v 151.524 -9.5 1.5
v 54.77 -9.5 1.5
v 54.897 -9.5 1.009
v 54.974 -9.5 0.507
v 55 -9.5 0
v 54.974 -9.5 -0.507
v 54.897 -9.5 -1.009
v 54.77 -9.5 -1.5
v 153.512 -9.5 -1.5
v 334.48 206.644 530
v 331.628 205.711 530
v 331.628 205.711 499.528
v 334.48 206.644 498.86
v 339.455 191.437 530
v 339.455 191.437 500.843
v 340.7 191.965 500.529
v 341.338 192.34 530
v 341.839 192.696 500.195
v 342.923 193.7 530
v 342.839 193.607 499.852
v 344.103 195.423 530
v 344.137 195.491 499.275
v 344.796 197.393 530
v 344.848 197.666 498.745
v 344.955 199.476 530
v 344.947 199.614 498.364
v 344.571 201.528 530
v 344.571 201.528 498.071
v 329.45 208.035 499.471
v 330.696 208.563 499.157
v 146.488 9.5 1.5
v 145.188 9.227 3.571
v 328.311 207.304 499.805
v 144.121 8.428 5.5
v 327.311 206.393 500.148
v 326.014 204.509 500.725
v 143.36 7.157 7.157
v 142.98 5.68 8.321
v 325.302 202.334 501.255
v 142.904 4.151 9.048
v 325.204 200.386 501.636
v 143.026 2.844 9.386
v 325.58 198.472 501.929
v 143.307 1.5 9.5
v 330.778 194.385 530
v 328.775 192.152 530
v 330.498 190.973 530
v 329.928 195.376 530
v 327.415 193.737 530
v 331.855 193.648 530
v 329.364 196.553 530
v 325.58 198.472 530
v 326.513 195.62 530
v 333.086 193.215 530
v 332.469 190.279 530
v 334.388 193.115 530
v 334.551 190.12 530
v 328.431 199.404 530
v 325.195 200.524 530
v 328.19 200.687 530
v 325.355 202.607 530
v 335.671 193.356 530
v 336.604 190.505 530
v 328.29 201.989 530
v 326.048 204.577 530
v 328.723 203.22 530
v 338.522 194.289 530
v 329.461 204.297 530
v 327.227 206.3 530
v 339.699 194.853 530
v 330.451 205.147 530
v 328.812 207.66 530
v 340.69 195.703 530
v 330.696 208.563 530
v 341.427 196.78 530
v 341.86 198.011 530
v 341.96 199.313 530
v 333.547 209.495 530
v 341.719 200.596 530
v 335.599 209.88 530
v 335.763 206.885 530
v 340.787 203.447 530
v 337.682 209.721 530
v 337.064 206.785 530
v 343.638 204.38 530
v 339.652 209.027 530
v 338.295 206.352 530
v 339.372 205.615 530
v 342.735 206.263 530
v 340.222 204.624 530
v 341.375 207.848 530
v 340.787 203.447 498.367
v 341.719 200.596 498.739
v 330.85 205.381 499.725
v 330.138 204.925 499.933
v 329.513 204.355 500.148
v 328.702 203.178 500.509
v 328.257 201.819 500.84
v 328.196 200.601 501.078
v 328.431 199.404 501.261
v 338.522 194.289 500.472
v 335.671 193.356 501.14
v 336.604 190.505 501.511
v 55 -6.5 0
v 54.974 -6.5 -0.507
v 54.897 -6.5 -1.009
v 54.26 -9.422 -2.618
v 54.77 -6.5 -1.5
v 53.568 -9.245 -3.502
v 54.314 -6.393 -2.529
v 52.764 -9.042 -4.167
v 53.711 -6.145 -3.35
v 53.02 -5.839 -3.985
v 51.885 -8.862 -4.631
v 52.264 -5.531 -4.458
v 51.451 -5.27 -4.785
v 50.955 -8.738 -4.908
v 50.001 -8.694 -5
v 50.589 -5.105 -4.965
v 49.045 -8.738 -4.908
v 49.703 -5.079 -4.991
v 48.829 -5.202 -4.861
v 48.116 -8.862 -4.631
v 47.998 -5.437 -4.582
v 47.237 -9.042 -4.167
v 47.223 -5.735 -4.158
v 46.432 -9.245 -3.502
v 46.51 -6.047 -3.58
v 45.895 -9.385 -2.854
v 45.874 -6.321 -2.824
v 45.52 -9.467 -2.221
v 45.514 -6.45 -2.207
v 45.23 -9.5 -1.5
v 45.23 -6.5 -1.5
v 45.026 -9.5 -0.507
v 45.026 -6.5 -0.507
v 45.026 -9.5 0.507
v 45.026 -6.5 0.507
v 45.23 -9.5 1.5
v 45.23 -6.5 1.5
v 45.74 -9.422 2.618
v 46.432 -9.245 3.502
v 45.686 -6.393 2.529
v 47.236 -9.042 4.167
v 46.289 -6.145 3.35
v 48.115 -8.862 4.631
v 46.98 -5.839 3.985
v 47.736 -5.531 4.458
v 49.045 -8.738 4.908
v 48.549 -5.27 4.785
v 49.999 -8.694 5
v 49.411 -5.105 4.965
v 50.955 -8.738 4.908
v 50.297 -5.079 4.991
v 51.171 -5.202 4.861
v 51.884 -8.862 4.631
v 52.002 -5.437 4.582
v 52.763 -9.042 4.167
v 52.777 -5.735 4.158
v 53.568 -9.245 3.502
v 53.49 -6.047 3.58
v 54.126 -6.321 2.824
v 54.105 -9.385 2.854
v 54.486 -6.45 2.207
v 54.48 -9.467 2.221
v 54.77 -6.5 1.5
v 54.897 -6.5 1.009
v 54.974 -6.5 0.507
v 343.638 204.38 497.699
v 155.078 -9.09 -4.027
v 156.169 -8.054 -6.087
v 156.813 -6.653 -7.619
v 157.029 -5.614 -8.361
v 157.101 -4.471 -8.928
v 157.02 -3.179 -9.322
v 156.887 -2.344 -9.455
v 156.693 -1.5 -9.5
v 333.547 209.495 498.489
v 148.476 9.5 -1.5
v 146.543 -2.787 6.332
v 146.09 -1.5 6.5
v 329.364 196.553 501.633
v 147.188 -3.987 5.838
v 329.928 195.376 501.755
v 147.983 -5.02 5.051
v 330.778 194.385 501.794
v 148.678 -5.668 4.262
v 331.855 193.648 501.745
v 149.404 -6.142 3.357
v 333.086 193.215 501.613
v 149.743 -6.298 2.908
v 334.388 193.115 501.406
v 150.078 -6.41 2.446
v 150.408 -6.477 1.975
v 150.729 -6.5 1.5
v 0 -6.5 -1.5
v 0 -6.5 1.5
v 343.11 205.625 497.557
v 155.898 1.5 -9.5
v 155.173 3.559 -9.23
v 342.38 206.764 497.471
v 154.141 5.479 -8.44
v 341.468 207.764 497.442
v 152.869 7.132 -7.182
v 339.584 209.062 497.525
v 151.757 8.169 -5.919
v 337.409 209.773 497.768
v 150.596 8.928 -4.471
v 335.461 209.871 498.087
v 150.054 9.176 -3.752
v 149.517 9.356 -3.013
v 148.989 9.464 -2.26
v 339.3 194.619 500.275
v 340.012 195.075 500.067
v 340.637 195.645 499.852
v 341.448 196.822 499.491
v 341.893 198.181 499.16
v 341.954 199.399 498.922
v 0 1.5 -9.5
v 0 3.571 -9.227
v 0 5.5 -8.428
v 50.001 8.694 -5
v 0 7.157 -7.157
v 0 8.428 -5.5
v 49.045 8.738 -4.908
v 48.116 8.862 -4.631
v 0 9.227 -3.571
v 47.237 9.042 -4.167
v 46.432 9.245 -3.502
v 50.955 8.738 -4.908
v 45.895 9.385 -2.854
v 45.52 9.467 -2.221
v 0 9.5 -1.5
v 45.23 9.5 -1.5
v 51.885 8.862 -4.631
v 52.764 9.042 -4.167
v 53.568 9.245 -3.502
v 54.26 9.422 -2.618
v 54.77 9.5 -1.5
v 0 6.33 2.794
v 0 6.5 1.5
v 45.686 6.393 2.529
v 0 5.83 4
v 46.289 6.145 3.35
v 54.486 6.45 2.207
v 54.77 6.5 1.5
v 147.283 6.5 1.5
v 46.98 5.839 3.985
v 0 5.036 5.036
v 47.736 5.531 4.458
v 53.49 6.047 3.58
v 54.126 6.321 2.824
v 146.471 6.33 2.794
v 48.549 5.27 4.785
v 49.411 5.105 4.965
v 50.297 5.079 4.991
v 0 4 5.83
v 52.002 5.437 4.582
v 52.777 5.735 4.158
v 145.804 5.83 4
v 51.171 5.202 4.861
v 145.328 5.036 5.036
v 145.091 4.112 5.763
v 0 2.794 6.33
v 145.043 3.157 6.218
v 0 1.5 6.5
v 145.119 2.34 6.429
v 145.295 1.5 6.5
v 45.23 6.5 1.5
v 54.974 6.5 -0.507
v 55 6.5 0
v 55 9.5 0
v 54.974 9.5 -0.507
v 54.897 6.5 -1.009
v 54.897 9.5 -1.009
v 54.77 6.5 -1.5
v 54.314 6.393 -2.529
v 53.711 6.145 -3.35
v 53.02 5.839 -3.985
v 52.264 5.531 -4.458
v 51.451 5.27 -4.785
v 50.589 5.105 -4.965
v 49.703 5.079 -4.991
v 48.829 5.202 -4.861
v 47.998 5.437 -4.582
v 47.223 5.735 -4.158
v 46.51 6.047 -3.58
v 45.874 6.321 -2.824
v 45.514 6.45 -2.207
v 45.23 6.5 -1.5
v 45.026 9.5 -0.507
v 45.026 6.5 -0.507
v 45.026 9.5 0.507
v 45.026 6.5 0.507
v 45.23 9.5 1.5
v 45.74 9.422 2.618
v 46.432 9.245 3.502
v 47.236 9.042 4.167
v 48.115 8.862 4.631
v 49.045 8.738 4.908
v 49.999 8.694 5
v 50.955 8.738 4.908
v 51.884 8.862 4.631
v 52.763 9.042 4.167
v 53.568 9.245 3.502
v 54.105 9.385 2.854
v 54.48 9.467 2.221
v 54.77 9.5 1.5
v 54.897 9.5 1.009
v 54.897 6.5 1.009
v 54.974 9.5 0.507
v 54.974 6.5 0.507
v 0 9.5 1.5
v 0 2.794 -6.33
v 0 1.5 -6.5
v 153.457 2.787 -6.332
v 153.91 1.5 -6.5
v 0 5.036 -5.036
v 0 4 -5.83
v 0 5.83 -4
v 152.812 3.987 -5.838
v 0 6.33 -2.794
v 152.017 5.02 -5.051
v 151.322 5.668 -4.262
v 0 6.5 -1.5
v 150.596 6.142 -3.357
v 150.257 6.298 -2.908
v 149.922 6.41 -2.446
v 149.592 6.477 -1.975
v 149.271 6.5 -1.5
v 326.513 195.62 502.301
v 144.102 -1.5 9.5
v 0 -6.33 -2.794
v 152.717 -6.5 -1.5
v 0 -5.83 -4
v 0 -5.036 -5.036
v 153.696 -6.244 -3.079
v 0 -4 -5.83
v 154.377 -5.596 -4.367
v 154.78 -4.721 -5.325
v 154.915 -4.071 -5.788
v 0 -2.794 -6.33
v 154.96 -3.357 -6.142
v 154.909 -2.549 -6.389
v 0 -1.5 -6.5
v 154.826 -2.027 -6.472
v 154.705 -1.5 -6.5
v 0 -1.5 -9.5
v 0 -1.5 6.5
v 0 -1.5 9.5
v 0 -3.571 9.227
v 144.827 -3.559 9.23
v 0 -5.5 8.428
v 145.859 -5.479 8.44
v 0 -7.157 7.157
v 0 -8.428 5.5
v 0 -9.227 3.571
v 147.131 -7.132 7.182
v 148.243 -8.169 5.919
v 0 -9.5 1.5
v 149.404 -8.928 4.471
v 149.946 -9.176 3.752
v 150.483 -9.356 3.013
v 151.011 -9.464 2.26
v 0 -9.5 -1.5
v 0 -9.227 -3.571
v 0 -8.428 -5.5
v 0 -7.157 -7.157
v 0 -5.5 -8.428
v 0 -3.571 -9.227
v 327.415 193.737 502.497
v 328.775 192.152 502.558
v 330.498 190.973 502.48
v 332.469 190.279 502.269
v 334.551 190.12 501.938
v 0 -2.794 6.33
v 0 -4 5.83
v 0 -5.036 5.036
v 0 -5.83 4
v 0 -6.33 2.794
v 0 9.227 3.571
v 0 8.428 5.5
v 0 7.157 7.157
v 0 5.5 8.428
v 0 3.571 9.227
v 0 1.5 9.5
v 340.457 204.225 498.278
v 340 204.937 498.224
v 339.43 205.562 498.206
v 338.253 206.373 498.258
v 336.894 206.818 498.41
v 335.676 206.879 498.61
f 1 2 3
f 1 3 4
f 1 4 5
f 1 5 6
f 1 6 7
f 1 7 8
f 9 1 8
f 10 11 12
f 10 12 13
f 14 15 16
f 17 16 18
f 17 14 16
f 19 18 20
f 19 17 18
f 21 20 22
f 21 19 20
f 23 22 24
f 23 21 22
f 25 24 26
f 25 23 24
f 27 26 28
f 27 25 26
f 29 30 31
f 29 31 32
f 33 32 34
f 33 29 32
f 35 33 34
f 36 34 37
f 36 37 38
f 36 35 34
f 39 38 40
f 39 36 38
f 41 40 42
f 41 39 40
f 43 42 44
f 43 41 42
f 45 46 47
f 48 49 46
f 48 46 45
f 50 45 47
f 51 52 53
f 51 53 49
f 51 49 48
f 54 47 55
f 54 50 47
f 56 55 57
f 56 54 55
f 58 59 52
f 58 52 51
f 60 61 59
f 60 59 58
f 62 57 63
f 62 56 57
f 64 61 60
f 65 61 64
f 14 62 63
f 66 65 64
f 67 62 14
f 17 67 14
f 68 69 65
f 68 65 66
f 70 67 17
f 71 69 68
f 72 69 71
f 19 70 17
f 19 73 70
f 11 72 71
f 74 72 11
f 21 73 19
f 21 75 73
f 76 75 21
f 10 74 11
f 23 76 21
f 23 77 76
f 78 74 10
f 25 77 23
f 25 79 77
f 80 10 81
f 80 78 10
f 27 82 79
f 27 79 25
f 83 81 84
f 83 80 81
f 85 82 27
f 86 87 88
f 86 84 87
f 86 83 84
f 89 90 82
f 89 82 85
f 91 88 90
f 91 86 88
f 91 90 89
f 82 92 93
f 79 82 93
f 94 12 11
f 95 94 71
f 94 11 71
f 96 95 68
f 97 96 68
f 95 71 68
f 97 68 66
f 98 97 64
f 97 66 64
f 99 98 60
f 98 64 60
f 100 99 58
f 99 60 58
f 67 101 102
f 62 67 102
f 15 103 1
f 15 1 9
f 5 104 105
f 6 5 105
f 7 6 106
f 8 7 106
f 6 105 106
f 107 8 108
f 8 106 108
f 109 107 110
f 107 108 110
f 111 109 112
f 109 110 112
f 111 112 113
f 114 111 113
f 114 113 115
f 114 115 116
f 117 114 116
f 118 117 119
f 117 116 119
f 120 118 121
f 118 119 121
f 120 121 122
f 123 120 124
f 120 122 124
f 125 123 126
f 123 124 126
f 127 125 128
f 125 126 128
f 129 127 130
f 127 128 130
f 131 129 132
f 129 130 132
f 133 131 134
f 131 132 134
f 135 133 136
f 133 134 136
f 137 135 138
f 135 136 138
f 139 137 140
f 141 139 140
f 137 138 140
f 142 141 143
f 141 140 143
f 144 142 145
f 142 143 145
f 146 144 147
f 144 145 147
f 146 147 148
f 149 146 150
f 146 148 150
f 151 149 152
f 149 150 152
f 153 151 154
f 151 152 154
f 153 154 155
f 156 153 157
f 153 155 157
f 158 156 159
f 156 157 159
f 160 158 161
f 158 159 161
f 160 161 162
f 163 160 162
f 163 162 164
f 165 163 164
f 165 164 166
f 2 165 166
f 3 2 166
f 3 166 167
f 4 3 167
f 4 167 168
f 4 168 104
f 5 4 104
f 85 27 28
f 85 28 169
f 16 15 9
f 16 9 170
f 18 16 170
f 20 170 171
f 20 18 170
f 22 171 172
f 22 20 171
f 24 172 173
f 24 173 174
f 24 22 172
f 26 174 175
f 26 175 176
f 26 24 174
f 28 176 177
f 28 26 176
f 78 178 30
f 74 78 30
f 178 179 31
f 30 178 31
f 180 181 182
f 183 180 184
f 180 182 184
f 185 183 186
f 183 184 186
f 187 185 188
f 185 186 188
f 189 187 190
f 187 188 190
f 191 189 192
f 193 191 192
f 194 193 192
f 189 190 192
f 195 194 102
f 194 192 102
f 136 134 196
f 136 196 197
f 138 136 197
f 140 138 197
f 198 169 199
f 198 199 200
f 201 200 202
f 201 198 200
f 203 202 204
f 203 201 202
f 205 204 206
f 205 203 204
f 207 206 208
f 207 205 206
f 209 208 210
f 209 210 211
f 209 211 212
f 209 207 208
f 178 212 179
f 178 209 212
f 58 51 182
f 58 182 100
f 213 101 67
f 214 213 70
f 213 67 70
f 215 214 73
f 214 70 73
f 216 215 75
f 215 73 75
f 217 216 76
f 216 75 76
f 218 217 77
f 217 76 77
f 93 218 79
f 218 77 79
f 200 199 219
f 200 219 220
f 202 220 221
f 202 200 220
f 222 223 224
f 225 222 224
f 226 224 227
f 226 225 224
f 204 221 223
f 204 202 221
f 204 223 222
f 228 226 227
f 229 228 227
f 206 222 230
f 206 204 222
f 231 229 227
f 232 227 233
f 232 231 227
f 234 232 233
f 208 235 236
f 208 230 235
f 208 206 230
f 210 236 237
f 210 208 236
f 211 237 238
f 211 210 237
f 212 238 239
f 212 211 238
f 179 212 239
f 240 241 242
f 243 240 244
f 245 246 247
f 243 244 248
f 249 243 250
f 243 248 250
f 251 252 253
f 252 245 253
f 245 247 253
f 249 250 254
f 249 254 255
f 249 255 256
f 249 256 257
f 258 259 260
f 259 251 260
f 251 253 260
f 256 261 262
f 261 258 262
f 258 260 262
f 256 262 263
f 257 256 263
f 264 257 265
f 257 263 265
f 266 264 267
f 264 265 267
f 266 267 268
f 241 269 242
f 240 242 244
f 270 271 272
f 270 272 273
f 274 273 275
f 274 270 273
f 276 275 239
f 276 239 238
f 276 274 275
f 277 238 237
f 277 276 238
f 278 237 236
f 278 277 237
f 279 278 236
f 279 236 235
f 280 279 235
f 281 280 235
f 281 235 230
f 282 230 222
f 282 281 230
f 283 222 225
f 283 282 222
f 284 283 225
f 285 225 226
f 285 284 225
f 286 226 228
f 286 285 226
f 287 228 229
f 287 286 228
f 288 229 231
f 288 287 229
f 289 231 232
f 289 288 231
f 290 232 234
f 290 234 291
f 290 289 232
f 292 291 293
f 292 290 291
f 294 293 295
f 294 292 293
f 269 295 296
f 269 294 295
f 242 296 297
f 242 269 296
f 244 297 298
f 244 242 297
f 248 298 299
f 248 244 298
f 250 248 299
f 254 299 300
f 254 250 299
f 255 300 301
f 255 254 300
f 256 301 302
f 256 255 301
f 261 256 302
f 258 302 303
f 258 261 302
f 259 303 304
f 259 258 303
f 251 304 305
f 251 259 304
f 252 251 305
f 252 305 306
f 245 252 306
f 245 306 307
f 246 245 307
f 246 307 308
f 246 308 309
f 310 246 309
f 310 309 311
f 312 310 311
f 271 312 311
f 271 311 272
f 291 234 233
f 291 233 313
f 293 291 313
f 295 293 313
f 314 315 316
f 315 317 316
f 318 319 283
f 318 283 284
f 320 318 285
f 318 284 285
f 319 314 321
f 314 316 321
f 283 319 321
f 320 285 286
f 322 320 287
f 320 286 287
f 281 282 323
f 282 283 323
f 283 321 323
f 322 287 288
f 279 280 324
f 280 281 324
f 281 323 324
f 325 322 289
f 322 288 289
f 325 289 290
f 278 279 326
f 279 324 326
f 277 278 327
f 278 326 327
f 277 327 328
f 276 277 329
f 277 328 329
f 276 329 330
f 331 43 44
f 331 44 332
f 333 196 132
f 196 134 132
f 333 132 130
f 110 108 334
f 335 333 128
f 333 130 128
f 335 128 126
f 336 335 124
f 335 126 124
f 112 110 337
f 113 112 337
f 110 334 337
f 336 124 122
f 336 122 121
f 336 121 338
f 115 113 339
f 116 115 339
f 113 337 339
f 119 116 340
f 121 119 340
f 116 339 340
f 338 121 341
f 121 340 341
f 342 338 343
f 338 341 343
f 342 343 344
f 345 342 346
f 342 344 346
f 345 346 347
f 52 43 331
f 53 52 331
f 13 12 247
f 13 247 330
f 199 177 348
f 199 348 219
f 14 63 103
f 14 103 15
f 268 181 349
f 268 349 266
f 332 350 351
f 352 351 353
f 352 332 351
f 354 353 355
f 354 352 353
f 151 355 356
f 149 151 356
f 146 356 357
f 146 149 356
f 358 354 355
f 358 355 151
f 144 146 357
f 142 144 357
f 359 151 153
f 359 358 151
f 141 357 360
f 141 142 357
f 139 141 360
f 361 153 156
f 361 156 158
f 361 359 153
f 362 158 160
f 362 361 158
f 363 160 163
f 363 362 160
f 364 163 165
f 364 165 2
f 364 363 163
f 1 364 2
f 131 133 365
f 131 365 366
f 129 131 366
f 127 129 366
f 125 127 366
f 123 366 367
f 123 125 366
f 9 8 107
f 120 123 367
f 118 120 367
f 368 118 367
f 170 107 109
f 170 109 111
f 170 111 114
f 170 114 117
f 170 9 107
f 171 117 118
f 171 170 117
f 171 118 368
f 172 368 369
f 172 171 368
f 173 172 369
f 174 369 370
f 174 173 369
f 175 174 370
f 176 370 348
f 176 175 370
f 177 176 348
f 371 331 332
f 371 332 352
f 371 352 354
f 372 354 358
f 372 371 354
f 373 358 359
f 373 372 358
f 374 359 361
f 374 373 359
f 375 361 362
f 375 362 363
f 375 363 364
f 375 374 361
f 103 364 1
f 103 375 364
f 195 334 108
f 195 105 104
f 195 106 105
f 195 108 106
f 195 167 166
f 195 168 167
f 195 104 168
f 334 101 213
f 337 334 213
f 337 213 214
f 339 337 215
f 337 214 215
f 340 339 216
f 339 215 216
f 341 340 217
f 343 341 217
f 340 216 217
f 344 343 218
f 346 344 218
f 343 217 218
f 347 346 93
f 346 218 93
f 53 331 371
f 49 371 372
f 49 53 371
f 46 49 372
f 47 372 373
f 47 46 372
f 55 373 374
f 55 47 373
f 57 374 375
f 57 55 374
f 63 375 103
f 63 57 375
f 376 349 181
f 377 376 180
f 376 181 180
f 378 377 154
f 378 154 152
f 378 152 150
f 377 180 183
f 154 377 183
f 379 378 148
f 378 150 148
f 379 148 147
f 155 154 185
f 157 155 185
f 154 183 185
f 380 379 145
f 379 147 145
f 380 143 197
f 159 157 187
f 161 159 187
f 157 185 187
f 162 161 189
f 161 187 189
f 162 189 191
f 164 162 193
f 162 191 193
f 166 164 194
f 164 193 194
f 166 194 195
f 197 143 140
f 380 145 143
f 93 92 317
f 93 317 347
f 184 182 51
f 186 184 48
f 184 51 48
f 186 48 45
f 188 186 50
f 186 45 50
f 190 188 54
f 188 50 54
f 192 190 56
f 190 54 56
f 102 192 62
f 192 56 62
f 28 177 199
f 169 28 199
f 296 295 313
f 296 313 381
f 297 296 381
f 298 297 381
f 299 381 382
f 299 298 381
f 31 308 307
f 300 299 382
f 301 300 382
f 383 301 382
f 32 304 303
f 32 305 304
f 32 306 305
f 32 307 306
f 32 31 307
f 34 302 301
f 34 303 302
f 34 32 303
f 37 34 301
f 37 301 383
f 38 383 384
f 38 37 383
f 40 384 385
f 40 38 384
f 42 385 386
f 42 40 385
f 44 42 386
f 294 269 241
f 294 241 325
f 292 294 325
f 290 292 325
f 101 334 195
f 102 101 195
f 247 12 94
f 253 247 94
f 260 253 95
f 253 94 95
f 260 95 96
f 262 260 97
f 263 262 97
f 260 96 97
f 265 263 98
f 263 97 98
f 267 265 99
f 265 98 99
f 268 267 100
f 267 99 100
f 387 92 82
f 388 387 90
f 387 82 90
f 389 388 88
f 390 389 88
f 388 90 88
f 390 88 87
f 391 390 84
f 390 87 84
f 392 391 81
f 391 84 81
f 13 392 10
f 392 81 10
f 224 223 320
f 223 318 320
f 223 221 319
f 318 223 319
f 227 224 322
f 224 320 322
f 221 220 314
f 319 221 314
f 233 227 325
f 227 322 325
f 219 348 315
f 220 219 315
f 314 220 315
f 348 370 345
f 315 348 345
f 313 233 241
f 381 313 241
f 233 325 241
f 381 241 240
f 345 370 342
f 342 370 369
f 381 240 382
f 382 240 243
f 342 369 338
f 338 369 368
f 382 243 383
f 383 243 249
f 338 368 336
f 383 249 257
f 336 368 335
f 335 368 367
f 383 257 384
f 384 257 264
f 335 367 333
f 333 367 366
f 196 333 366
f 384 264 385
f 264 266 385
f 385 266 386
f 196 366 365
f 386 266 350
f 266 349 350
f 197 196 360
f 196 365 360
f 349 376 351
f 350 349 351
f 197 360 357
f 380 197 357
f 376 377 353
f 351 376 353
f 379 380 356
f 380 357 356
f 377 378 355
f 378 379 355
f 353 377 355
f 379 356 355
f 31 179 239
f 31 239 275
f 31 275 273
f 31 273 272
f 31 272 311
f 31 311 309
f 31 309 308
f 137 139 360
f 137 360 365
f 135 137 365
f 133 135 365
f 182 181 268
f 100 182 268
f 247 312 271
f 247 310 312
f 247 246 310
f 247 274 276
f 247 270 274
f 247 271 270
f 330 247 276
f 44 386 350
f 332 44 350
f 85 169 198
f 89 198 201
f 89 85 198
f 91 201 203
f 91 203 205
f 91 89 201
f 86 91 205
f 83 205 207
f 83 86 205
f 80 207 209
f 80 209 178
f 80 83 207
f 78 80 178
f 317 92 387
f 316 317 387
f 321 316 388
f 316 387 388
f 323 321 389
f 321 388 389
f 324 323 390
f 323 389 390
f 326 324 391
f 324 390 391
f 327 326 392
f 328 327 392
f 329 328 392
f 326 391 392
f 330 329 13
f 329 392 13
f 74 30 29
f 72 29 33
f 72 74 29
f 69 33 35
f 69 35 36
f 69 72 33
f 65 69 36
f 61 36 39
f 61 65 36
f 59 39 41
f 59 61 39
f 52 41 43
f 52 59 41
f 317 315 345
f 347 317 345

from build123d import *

# Parameters (mm, degrees)
SKETCH21_R              = 5
CUT_EXTRUDE3_DEPTH      = 210.892061542
CUT_EXTRUDE3_DEPTH_BACK = 10.5


with BuildPart() as part:
    # Sweep-Thin3: sweep along a curve in space
    with BuildLine() as sweep_thin3_path:
        Line((0, 0, 0), (150, 0, 0))
        Line((150, 0, 0), (335.07515147, 200, 500))
        Line((335.07515147, 200, 500), (335.07515147, 200, 530))
    # Sketch2 → Sweep-Thin3 (sweep)
    with BuildSketch(Plane(origin=(0, 0, 0), x_dir=(0, 0, -1), z_dir=(1, 0, 0))):
        with BuildLine():
            Line((1.5, 9.5), (-1.5, 9.5))
            ThreePointArc((-1.5, 9.5), (-7.156854249, 7.156854249), (-9.5, 1.5))
            Line((-9.5, 1.5), (-9.5, -1.5))
            ThreePointArc((-9.5, -1.5), (-7.156854249, -7.156854249), (-1.5, -9.5))
            Line((-1.5, -9.5), (1.5, -9.5))
            ThreePointArc((1.5, -9.5), (7.156854249, -7.156854249), (9.5, -1.5))
            Line((9.5, -1.5), (9.5, 1.5))
            ThreePointArc((9.5, 1.5), (7.156854249, 7.156854249), (1.5, 9.5))
        make_face()
        with BuildLine():
            Line((1.5, 6.5), (-1.5, 6.5))
            ThreePointArc((-1.5, 6.5), (-5.035533906, 5.035533906), (-6.5, 1.5))
            Line((-6.5, 1.5), (-6.5, -1.5))
            ThreePointArc((-6.5, -1.5), (-5.035533906, -5.035533906), (-1.5, -6.5))
            Line((-1.5, -6.5), (1.5, -6.5))
            ThreePointArc((1.5, -6.5), (5.035533906, -5.035533906), (6.5, -1.5))
            Line((6.5, -1.5), (6.5, 1.5))
            ThreePointArc((6.5, 1.5), (5.035533906, 5.035533906), (1.5, 6.5))
        make_face(mode=Mode.SUBTRACT)
    sweep(path=sweep_thin3_path.line, transition=Transition.RIGHT)

    # Sketch21 → Cut-Extrude3 (cut, two sides)
    with BuildSketch(Plane(origin=(0, 0, 0), x_dir=(1, 0, 0), z_dir=(0, 1, 0))) as cut_extrude3_sk:
        with Locations((50, 0)):
            Circle(SKETCH21_R)
    extrude(amount=CUT_EXTRUDE3_DEPTH, mode=Mode.SUBTRACT)
    extrude(cut_extrude3_sk.sketch, amount=-CUT_EXTRUDE3_DEPTH_BACK, mode=Mode.SUBTRACT)


solid = part.part
